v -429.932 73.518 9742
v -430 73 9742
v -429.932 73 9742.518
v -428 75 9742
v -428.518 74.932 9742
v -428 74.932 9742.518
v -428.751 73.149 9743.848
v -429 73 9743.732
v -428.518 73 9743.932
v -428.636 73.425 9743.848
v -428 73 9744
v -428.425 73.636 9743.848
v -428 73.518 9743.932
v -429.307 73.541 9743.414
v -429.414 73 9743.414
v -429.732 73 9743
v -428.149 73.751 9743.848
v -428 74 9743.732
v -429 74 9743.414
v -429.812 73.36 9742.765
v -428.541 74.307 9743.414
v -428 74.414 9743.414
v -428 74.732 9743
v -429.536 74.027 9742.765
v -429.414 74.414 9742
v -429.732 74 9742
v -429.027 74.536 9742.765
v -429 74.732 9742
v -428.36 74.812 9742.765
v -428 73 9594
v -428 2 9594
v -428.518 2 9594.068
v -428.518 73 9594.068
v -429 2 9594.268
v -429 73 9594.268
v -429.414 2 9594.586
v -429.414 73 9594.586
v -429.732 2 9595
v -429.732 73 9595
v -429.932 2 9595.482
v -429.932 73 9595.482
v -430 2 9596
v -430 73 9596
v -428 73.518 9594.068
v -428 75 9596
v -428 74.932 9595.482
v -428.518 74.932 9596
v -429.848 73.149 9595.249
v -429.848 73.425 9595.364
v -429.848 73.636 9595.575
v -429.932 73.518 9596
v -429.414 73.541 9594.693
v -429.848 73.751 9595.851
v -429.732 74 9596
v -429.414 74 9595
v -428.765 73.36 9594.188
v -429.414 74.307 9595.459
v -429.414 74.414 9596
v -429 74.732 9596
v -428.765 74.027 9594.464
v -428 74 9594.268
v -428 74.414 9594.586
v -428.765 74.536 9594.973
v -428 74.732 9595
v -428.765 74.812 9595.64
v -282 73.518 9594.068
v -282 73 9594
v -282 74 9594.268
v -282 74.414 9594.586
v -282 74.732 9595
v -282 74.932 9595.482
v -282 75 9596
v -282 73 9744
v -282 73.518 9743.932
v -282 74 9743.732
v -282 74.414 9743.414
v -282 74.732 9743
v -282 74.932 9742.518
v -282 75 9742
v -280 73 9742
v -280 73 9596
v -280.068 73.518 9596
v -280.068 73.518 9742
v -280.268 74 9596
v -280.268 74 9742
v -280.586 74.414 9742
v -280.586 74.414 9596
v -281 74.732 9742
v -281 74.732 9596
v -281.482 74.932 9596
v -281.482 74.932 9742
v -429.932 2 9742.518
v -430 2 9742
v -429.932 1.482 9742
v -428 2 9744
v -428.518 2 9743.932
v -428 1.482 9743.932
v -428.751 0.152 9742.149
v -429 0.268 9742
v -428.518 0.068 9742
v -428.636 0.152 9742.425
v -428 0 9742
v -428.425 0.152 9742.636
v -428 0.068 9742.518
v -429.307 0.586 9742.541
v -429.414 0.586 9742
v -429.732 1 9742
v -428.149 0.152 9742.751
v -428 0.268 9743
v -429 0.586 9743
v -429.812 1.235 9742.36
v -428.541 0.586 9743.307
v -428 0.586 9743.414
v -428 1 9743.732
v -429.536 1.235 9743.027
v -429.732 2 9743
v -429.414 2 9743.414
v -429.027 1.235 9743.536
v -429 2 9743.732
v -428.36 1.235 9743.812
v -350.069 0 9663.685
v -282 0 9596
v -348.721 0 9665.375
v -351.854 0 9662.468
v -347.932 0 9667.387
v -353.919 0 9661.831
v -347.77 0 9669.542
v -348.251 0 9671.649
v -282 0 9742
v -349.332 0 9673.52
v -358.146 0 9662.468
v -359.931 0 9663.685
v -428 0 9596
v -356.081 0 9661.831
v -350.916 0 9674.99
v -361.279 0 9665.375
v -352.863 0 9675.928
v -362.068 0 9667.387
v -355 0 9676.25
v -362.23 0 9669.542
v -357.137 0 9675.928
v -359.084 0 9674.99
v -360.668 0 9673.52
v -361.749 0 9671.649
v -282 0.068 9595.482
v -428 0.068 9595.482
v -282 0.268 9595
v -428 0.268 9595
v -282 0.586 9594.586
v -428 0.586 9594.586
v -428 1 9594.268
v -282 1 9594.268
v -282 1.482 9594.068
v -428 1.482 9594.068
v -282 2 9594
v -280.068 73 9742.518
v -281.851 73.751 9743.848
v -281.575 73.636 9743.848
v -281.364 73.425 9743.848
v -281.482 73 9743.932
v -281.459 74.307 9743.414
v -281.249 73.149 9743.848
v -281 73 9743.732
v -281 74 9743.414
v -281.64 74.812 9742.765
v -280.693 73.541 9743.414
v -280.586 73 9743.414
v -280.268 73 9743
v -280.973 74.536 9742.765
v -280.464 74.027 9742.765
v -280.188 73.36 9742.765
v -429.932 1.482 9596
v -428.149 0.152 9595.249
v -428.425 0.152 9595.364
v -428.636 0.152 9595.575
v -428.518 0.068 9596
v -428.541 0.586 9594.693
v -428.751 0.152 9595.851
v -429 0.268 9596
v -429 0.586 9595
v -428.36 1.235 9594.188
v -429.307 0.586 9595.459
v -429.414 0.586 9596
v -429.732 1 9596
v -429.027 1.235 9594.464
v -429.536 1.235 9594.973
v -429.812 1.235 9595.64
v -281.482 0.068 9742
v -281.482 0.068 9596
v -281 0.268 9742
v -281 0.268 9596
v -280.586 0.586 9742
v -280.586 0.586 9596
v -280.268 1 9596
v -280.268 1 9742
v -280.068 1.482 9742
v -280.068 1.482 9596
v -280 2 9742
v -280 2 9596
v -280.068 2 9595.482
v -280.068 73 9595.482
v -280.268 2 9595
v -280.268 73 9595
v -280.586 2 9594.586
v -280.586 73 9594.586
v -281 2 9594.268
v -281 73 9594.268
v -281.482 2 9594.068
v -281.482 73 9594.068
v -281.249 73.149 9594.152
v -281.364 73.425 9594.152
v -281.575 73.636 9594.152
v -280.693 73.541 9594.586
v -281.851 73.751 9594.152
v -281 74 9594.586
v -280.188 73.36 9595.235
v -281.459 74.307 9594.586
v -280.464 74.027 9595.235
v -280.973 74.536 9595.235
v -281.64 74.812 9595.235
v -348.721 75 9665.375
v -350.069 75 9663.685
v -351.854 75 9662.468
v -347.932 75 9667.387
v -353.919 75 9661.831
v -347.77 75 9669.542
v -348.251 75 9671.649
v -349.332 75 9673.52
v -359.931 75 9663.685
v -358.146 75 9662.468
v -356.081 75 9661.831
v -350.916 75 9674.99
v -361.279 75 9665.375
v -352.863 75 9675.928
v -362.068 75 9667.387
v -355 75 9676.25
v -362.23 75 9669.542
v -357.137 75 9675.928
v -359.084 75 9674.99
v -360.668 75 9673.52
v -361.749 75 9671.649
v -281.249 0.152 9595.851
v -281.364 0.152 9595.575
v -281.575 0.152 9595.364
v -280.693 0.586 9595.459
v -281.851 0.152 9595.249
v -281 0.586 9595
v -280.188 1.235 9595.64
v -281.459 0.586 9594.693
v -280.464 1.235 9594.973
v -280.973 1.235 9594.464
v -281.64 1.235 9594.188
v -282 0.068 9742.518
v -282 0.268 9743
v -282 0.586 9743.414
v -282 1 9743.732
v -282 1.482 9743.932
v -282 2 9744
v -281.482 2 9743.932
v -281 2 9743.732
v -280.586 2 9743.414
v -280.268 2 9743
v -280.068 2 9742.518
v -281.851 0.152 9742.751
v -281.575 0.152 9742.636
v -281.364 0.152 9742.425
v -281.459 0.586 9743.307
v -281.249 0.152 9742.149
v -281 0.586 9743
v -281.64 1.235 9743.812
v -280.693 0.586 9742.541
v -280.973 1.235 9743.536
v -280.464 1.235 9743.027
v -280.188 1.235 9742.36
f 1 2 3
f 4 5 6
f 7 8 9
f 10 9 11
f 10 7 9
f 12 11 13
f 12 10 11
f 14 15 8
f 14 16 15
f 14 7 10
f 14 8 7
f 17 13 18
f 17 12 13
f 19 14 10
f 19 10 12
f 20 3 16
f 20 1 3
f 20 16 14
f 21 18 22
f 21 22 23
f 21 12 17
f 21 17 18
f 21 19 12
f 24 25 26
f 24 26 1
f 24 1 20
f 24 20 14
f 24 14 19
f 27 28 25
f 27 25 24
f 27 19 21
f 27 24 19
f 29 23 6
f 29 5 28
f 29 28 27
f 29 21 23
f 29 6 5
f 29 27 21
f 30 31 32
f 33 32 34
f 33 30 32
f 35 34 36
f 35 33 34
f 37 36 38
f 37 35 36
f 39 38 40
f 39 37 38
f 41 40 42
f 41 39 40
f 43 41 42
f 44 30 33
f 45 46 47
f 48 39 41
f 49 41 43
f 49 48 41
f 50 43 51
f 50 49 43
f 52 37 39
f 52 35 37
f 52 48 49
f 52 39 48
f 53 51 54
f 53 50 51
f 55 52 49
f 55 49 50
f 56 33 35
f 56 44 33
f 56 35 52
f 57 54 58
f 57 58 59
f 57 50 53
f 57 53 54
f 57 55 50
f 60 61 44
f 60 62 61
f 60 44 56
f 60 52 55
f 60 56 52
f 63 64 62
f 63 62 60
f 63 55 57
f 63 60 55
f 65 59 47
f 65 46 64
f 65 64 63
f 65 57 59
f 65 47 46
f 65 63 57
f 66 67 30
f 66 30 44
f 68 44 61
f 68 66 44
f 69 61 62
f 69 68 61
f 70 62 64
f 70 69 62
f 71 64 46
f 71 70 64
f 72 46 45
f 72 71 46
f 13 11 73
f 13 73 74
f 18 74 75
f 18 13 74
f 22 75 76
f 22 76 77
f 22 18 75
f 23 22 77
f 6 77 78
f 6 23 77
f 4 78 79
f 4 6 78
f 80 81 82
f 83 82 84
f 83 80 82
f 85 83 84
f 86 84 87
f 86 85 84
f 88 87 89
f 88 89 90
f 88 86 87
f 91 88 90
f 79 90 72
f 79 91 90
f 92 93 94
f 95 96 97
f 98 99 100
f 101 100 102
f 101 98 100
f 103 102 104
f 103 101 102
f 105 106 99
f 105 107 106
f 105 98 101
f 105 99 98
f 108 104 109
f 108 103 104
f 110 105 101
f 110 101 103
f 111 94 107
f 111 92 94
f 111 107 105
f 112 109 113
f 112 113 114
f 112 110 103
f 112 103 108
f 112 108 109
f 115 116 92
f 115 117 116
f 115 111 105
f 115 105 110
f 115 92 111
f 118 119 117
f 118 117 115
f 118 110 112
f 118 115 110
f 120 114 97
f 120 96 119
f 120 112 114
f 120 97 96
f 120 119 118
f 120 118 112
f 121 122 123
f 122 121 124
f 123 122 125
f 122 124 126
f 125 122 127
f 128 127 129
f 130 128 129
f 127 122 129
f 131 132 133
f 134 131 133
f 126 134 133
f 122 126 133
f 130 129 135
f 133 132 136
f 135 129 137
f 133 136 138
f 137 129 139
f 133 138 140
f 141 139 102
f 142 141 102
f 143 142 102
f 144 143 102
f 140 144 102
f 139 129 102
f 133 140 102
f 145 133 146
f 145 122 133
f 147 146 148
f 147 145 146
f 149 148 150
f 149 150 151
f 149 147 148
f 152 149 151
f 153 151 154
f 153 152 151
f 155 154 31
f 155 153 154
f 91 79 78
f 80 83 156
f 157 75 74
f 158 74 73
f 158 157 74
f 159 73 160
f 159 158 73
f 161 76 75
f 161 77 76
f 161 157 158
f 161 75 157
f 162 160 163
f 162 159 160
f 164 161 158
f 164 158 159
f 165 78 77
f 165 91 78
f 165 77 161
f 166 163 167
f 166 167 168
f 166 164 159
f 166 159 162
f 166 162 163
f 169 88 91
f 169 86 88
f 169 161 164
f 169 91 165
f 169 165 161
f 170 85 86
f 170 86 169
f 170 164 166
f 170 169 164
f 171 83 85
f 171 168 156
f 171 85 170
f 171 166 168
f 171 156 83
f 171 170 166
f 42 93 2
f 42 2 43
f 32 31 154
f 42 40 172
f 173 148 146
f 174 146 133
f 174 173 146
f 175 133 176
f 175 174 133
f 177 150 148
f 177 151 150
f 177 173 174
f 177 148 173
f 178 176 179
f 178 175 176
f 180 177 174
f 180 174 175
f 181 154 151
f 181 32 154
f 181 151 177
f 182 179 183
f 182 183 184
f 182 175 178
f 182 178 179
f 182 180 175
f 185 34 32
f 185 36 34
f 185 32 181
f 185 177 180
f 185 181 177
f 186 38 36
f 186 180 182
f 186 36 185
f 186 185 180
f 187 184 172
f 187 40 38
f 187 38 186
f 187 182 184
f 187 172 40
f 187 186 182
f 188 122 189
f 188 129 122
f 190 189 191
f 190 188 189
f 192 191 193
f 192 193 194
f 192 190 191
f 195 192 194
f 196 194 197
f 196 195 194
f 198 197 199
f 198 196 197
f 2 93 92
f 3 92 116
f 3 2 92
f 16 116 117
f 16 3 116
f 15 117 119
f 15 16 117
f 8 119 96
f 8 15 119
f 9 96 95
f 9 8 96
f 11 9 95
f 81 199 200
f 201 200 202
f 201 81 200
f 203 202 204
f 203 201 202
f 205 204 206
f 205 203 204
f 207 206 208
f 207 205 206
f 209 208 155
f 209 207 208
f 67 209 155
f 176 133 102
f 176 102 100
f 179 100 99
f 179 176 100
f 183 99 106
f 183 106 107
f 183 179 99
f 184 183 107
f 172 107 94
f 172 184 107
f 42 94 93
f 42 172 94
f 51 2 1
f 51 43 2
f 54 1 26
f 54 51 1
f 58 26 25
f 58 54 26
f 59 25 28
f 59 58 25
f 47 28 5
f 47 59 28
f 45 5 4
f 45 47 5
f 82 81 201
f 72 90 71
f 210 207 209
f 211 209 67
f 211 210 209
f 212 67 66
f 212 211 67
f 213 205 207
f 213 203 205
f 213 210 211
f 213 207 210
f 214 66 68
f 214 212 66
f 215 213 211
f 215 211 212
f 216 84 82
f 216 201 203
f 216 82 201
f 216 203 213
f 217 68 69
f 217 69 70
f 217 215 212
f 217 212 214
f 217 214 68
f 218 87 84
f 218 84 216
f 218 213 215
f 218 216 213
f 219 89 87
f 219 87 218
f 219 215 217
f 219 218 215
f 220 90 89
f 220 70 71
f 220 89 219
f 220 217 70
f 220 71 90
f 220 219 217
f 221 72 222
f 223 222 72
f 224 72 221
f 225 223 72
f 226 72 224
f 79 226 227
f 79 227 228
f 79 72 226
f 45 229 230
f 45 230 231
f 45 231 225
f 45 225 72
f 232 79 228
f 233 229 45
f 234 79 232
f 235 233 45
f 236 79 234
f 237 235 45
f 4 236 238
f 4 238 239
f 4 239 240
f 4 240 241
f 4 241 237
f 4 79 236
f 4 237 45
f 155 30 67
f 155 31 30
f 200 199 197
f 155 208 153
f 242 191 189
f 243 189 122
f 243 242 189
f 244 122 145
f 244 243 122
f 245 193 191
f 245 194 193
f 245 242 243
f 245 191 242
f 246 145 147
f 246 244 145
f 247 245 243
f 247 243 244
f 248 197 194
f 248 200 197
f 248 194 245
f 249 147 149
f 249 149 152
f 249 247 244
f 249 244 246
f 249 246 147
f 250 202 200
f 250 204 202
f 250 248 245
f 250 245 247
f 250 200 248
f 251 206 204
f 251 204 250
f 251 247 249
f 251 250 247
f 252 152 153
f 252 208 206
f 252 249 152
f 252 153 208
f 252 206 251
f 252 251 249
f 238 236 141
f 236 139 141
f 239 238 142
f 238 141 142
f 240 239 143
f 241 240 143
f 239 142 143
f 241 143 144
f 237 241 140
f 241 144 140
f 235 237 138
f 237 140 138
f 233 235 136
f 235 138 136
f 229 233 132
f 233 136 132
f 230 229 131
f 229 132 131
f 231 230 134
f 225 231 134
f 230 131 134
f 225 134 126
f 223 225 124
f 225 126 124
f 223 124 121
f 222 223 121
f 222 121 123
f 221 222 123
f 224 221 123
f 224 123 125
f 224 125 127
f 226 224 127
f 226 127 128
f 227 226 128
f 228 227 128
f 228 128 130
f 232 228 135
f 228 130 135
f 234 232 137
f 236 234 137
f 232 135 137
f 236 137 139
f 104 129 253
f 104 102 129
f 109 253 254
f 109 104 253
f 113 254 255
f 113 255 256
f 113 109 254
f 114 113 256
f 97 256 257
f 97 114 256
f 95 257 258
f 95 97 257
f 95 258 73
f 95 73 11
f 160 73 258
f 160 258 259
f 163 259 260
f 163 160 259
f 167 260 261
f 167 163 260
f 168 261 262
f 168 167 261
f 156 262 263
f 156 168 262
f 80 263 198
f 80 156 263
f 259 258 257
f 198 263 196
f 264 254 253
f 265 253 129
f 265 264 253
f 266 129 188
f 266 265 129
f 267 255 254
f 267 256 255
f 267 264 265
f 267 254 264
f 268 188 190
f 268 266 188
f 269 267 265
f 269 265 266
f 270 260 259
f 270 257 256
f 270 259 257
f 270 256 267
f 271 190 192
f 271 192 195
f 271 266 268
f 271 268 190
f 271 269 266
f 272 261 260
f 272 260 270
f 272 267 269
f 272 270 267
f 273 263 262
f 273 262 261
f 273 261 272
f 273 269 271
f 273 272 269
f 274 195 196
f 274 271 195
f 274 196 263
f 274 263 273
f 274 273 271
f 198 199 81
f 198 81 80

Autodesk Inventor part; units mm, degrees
ref_plane "YZ Plane" through (0, 0, 0) normal (1, 0, 0) x (0, 1, 0)
ref_plane "XZ Plane" through (0, 0, 0) normal (0, 1, 0) x (-1, 0, 0)
ref_plane "XY Plane" through (0, 0, 0) normal (0, 0, 1) x (1, 0, 0)
sketch "Boceto1" plane through (0, 0, 0) normal (0, 1, 0) x (-1, 0, 0)
  line L0 (280, 9744) -> (430, 9744)
  line L1 (430, 9744) -> (430, 9594)
  line L2 (430, 9594) -> (280, 9594)
  line L3 (280, 9594) -> (280, 9744)
  point P0 (0, 0)
  dimension "d1" = 150
  dimension "d2" = 150
  dimension "d3" = 150
extrude "Extrusión1" add sketch "Boceto1" along normal blind 75
sketch "Boceto2" plane through (0, 75, 0) normal (0, 1, 0) x (1, 0, 0)
  point P0 (0, 0)
sketch "Boceto3" plane through (0, 75, 0) normal (0, 1, 0) x (1, 0, 0)
  point P0 (0, 0)
sketch "Boceto4" plane through (0, 75, 0) normal (0, 1, 0) x (1, 0, 0)
  circle A0 centre (-355, -9669) radius 7.25
  point P0 (0, 0)
  point P1 (-430, -9744)
  dimension "d8" = 14.5
hole "Agujero1" at (-355, 75, 9669) direction (0, -1, 0) diameter 14.5 end through all
fillet "Empalme1" radius 2 12 edges at (-280, 75, 9669) (-280, 37.5, 9594) (-355, 75, 9594) (-430, 37.5, 9594) (-430, 75, 9669) (-355, 75, 9744) (-430, 37.5, 9744) (-280, 37.5, 9744) (-280, 0, 9669) (-355, 0, 9594) (-430, 0, 9669) (-355, 0, 9744)
properties part number "robotico"
